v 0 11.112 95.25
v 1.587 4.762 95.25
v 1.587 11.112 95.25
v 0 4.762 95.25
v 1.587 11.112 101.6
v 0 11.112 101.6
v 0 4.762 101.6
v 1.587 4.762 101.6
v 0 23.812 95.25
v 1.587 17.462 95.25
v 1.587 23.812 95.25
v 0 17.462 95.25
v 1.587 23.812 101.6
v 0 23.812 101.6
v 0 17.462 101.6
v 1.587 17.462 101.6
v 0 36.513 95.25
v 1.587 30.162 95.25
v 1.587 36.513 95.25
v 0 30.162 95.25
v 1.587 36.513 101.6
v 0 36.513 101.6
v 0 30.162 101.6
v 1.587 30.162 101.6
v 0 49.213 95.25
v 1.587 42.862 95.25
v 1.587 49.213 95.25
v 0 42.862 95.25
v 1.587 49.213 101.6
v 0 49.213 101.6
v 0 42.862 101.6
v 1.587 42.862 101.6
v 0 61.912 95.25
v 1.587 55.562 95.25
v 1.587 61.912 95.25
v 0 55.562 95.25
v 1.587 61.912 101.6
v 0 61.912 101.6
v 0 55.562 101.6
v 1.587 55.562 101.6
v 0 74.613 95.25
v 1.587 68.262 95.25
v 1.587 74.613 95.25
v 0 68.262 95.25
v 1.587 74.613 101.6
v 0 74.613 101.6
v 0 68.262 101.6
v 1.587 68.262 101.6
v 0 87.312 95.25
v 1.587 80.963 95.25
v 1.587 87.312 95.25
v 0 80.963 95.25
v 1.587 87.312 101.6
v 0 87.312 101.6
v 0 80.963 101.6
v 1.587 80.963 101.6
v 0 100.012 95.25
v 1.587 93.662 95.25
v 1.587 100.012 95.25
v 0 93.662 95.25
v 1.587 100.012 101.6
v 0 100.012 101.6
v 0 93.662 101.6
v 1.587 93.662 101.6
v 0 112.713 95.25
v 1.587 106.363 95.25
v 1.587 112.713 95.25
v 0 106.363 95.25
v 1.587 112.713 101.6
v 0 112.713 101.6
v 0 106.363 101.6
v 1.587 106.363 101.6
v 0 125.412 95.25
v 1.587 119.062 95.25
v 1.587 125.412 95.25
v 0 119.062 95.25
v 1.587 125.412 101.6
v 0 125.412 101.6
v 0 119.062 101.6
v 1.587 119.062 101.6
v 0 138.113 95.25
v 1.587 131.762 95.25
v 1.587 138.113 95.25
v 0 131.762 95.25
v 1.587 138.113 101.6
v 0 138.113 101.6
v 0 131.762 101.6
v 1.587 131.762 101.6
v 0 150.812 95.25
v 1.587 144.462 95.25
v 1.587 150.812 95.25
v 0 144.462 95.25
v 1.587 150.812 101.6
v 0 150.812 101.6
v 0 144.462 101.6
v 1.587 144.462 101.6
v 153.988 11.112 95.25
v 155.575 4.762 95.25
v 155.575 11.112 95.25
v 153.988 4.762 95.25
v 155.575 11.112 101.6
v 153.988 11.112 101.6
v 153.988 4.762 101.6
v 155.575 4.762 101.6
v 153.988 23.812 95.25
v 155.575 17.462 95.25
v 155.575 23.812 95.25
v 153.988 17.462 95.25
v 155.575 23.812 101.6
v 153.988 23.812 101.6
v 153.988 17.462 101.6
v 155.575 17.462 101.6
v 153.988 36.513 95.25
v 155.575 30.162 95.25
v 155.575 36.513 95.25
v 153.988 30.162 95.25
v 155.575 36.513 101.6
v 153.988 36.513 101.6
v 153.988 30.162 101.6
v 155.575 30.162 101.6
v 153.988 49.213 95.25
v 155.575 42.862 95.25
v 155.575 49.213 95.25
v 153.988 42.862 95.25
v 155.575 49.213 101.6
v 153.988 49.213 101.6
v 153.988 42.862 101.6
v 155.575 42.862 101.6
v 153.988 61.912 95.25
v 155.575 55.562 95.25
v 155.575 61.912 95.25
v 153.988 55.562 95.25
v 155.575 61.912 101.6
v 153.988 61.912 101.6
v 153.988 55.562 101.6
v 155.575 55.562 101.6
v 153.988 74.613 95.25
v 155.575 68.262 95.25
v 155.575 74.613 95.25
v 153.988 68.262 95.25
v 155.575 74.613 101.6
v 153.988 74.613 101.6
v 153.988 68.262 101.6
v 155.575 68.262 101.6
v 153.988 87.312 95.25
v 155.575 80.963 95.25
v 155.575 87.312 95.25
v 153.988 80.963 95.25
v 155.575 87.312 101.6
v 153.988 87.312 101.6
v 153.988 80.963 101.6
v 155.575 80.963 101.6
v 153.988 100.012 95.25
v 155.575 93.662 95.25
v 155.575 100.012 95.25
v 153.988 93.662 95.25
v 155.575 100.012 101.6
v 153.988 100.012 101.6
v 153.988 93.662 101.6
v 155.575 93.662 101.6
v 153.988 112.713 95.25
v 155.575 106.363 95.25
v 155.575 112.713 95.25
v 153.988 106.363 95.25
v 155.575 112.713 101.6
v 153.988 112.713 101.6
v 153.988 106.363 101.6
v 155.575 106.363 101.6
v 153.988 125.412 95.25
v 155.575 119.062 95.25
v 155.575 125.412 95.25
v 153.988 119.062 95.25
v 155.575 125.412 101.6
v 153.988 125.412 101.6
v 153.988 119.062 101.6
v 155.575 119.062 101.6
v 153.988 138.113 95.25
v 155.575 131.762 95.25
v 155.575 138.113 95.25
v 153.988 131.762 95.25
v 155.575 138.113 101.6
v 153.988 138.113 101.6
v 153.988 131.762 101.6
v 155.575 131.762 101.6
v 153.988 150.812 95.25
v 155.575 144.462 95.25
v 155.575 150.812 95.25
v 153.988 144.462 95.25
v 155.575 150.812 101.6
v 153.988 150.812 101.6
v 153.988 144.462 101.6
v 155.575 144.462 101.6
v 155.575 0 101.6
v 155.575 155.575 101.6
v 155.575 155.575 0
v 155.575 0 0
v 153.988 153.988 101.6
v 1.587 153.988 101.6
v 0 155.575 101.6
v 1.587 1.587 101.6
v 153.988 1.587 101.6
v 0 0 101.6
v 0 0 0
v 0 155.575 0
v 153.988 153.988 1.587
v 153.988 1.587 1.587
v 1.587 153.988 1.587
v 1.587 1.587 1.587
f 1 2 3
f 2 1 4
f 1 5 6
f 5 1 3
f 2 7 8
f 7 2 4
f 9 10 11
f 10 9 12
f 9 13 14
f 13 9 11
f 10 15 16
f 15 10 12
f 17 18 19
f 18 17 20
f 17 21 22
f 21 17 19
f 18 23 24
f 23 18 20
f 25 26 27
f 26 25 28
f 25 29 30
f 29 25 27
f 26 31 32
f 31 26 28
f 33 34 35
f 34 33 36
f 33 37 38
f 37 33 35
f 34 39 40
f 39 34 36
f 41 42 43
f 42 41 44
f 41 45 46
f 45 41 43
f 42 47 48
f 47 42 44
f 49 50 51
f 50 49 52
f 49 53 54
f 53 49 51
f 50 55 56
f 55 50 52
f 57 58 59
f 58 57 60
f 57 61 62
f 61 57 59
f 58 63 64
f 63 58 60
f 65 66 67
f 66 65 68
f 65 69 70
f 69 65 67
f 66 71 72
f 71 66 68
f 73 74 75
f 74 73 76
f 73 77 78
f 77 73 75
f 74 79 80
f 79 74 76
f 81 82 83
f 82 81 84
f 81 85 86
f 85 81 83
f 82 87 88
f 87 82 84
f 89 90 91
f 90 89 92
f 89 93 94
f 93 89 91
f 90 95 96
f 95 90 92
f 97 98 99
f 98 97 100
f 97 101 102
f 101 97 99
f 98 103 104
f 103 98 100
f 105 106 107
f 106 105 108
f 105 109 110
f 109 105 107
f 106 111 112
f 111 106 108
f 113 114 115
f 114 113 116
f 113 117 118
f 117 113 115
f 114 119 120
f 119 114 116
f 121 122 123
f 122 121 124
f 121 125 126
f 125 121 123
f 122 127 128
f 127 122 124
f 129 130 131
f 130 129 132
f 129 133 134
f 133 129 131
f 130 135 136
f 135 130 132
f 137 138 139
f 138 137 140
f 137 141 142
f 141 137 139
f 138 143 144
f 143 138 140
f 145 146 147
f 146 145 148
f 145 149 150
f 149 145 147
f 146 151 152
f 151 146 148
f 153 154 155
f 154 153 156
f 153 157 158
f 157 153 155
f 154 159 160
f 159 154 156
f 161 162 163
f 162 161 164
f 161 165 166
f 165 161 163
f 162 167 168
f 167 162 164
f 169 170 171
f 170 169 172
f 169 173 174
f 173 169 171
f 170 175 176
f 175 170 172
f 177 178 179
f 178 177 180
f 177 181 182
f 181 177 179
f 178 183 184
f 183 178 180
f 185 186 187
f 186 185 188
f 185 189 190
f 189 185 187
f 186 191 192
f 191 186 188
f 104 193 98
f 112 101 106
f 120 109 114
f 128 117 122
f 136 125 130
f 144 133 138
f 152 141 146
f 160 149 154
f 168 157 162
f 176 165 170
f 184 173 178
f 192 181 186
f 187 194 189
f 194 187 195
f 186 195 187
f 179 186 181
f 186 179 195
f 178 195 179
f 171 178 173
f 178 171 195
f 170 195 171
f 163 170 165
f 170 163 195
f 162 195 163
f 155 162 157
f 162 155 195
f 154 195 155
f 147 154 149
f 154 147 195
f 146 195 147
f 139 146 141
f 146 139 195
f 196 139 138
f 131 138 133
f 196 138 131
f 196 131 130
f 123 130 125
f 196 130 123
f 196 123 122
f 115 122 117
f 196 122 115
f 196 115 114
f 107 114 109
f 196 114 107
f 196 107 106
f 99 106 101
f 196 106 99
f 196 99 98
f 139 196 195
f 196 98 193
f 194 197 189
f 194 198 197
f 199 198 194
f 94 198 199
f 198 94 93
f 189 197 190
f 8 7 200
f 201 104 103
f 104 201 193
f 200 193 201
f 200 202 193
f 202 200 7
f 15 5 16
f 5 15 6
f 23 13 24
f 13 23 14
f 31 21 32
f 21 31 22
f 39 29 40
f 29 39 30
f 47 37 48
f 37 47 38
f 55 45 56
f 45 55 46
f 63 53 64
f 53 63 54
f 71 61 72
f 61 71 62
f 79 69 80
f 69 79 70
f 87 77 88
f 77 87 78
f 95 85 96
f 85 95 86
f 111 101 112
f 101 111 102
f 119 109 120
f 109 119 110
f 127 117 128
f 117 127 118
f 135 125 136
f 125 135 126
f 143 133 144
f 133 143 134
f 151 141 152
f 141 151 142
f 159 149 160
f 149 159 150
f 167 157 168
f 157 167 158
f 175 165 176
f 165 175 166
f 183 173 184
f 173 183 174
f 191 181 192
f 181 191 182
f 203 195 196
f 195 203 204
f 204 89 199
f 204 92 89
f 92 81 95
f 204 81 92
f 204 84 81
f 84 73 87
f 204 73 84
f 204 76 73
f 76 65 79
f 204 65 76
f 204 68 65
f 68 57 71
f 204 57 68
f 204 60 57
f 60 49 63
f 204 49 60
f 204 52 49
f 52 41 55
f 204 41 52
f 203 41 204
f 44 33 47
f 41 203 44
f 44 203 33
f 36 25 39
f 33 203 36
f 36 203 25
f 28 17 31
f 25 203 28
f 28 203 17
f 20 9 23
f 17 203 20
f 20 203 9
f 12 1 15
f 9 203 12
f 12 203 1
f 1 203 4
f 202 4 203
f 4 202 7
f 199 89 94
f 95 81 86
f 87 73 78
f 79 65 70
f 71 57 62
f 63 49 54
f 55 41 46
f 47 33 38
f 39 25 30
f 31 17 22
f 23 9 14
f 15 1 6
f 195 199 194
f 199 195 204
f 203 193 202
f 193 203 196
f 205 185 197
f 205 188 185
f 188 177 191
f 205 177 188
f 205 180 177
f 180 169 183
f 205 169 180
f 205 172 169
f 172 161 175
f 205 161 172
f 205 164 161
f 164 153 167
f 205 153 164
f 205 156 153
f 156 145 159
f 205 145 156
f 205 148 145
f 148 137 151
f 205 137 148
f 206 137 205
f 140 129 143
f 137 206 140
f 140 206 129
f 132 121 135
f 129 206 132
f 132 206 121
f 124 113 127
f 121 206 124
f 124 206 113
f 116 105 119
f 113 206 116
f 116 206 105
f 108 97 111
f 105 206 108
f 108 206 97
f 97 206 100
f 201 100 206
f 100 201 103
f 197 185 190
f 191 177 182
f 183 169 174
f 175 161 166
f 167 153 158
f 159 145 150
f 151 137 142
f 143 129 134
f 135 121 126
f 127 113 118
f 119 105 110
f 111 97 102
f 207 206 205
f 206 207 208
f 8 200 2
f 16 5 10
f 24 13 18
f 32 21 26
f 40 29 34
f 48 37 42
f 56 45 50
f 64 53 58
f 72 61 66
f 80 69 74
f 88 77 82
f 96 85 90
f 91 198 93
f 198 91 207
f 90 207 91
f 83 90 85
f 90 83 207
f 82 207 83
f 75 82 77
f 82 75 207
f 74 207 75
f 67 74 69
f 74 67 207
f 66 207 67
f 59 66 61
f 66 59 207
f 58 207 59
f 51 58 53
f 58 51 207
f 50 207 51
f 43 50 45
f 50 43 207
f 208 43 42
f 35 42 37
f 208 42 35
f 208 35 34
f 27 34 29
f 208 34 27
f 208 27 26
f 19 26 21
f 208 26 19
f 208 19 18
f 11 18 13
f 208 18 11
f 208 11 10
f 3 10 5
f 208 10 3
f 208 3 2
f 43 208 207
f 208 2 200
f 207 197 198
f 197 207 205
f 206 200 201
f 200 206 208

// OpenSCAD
// Enclosure testing for the GEARS workshop
// Created 3 August 2026 by Sam Gardner <sam@wx4stg.com>


in = 25.4;
pad = in*1/16;
// Box shell options
DO_BOX = true;
DO_SEALED_LID = false;
DO_PERFORATED_LID = false;
// castle options
CASTLE_WIDTH = in*1/4;
CASTLE_HEIGHT = in*1/4;
CASTLE_SPACING = in*1/4;
// trianglual prism lid
LID_GAP = 2*pad;
LID_SKIRT_H = 1*in;
LID_ROOF_H = 2*in;


// triangluar prism with skirt shape
module lid_profile(w, skirt, ridge, drop = 0) {
    polygon([[0,-drop], [w,-drop], [w,skirt], [w/2,skirt+ridge], [0,skirt]]);
}

// extrude that shape along the y axis, handle rotation internally
module prism_y(depth) {
    translate([0, depth, 0]) rotate([90, 0, 0])
        linear_extrude(height = depth) children();
}

module castle_cuts(len, thickness) {
    total_length = CASTLE_WIDTH + CASTLE_SPACING;
    n_castles = floor((len + CASTLE_SPACING) / total_length);
    y_start = (len - (n_castles*total_length - CASTLE_SPACING)) / 2;
    for (i = [0 : n_castles-1]) {
        translate([-1, y_start + i*total_length, 4*in - CASTLE_HEIGHT])
            cube([thickness + 2, CASTLE_WIDTH, CASTLE_HEIGHT + 1]);
    }
}

// Box shell
if (DO_BOX) {
    box_w = 6*in + pad*2;

    difference() {
        cube([box_w, box_w, 4*in]);
        translate([pad, pad, pad]) cube([6*in, 6*in, 4*in]);
        castle_cuts(box_w, pad);
        translate([box_w - pad, 0, 0]) castle_cuts(box_w, pad);
    }
}

// sealed lid
if (DO_SEALED_LID) {
    translate([-2*pad, -2*pad, 3*in]) {
        difference() {
            cube([6*in+6*pad, 6*in+6*pad, 1*in]);
            translate([pad, pad, 0]) cube([6*in+4*pad, 6*in+4*pad, 1*in-pad]);
        }
    }
}

// triangular prism lid
if (DO_PERFORATED_LID) {
    box_w   = 6*in + pad*2;
    lid_in  = box_w + 2*LID_GAP;
    lid_out = lid_in + 2*pad;
    translate([-(LID_GAP+pad), -(LID_GAP+pad), 4*in - LID_SKIRT_H]) {
        difference() {
            prism_y(lid_out) lid_profile(lid_out, LID_SKIRT_H, LID_ROOF_H);
            translate([0, pad, 0]) prism_y(lid_in)
                offset(delta = -pad)
                    lid_profile(lid_out, LID_SKIRT_H, LID_ROOF_H, drop = 4*pad);
        }
    }
}
